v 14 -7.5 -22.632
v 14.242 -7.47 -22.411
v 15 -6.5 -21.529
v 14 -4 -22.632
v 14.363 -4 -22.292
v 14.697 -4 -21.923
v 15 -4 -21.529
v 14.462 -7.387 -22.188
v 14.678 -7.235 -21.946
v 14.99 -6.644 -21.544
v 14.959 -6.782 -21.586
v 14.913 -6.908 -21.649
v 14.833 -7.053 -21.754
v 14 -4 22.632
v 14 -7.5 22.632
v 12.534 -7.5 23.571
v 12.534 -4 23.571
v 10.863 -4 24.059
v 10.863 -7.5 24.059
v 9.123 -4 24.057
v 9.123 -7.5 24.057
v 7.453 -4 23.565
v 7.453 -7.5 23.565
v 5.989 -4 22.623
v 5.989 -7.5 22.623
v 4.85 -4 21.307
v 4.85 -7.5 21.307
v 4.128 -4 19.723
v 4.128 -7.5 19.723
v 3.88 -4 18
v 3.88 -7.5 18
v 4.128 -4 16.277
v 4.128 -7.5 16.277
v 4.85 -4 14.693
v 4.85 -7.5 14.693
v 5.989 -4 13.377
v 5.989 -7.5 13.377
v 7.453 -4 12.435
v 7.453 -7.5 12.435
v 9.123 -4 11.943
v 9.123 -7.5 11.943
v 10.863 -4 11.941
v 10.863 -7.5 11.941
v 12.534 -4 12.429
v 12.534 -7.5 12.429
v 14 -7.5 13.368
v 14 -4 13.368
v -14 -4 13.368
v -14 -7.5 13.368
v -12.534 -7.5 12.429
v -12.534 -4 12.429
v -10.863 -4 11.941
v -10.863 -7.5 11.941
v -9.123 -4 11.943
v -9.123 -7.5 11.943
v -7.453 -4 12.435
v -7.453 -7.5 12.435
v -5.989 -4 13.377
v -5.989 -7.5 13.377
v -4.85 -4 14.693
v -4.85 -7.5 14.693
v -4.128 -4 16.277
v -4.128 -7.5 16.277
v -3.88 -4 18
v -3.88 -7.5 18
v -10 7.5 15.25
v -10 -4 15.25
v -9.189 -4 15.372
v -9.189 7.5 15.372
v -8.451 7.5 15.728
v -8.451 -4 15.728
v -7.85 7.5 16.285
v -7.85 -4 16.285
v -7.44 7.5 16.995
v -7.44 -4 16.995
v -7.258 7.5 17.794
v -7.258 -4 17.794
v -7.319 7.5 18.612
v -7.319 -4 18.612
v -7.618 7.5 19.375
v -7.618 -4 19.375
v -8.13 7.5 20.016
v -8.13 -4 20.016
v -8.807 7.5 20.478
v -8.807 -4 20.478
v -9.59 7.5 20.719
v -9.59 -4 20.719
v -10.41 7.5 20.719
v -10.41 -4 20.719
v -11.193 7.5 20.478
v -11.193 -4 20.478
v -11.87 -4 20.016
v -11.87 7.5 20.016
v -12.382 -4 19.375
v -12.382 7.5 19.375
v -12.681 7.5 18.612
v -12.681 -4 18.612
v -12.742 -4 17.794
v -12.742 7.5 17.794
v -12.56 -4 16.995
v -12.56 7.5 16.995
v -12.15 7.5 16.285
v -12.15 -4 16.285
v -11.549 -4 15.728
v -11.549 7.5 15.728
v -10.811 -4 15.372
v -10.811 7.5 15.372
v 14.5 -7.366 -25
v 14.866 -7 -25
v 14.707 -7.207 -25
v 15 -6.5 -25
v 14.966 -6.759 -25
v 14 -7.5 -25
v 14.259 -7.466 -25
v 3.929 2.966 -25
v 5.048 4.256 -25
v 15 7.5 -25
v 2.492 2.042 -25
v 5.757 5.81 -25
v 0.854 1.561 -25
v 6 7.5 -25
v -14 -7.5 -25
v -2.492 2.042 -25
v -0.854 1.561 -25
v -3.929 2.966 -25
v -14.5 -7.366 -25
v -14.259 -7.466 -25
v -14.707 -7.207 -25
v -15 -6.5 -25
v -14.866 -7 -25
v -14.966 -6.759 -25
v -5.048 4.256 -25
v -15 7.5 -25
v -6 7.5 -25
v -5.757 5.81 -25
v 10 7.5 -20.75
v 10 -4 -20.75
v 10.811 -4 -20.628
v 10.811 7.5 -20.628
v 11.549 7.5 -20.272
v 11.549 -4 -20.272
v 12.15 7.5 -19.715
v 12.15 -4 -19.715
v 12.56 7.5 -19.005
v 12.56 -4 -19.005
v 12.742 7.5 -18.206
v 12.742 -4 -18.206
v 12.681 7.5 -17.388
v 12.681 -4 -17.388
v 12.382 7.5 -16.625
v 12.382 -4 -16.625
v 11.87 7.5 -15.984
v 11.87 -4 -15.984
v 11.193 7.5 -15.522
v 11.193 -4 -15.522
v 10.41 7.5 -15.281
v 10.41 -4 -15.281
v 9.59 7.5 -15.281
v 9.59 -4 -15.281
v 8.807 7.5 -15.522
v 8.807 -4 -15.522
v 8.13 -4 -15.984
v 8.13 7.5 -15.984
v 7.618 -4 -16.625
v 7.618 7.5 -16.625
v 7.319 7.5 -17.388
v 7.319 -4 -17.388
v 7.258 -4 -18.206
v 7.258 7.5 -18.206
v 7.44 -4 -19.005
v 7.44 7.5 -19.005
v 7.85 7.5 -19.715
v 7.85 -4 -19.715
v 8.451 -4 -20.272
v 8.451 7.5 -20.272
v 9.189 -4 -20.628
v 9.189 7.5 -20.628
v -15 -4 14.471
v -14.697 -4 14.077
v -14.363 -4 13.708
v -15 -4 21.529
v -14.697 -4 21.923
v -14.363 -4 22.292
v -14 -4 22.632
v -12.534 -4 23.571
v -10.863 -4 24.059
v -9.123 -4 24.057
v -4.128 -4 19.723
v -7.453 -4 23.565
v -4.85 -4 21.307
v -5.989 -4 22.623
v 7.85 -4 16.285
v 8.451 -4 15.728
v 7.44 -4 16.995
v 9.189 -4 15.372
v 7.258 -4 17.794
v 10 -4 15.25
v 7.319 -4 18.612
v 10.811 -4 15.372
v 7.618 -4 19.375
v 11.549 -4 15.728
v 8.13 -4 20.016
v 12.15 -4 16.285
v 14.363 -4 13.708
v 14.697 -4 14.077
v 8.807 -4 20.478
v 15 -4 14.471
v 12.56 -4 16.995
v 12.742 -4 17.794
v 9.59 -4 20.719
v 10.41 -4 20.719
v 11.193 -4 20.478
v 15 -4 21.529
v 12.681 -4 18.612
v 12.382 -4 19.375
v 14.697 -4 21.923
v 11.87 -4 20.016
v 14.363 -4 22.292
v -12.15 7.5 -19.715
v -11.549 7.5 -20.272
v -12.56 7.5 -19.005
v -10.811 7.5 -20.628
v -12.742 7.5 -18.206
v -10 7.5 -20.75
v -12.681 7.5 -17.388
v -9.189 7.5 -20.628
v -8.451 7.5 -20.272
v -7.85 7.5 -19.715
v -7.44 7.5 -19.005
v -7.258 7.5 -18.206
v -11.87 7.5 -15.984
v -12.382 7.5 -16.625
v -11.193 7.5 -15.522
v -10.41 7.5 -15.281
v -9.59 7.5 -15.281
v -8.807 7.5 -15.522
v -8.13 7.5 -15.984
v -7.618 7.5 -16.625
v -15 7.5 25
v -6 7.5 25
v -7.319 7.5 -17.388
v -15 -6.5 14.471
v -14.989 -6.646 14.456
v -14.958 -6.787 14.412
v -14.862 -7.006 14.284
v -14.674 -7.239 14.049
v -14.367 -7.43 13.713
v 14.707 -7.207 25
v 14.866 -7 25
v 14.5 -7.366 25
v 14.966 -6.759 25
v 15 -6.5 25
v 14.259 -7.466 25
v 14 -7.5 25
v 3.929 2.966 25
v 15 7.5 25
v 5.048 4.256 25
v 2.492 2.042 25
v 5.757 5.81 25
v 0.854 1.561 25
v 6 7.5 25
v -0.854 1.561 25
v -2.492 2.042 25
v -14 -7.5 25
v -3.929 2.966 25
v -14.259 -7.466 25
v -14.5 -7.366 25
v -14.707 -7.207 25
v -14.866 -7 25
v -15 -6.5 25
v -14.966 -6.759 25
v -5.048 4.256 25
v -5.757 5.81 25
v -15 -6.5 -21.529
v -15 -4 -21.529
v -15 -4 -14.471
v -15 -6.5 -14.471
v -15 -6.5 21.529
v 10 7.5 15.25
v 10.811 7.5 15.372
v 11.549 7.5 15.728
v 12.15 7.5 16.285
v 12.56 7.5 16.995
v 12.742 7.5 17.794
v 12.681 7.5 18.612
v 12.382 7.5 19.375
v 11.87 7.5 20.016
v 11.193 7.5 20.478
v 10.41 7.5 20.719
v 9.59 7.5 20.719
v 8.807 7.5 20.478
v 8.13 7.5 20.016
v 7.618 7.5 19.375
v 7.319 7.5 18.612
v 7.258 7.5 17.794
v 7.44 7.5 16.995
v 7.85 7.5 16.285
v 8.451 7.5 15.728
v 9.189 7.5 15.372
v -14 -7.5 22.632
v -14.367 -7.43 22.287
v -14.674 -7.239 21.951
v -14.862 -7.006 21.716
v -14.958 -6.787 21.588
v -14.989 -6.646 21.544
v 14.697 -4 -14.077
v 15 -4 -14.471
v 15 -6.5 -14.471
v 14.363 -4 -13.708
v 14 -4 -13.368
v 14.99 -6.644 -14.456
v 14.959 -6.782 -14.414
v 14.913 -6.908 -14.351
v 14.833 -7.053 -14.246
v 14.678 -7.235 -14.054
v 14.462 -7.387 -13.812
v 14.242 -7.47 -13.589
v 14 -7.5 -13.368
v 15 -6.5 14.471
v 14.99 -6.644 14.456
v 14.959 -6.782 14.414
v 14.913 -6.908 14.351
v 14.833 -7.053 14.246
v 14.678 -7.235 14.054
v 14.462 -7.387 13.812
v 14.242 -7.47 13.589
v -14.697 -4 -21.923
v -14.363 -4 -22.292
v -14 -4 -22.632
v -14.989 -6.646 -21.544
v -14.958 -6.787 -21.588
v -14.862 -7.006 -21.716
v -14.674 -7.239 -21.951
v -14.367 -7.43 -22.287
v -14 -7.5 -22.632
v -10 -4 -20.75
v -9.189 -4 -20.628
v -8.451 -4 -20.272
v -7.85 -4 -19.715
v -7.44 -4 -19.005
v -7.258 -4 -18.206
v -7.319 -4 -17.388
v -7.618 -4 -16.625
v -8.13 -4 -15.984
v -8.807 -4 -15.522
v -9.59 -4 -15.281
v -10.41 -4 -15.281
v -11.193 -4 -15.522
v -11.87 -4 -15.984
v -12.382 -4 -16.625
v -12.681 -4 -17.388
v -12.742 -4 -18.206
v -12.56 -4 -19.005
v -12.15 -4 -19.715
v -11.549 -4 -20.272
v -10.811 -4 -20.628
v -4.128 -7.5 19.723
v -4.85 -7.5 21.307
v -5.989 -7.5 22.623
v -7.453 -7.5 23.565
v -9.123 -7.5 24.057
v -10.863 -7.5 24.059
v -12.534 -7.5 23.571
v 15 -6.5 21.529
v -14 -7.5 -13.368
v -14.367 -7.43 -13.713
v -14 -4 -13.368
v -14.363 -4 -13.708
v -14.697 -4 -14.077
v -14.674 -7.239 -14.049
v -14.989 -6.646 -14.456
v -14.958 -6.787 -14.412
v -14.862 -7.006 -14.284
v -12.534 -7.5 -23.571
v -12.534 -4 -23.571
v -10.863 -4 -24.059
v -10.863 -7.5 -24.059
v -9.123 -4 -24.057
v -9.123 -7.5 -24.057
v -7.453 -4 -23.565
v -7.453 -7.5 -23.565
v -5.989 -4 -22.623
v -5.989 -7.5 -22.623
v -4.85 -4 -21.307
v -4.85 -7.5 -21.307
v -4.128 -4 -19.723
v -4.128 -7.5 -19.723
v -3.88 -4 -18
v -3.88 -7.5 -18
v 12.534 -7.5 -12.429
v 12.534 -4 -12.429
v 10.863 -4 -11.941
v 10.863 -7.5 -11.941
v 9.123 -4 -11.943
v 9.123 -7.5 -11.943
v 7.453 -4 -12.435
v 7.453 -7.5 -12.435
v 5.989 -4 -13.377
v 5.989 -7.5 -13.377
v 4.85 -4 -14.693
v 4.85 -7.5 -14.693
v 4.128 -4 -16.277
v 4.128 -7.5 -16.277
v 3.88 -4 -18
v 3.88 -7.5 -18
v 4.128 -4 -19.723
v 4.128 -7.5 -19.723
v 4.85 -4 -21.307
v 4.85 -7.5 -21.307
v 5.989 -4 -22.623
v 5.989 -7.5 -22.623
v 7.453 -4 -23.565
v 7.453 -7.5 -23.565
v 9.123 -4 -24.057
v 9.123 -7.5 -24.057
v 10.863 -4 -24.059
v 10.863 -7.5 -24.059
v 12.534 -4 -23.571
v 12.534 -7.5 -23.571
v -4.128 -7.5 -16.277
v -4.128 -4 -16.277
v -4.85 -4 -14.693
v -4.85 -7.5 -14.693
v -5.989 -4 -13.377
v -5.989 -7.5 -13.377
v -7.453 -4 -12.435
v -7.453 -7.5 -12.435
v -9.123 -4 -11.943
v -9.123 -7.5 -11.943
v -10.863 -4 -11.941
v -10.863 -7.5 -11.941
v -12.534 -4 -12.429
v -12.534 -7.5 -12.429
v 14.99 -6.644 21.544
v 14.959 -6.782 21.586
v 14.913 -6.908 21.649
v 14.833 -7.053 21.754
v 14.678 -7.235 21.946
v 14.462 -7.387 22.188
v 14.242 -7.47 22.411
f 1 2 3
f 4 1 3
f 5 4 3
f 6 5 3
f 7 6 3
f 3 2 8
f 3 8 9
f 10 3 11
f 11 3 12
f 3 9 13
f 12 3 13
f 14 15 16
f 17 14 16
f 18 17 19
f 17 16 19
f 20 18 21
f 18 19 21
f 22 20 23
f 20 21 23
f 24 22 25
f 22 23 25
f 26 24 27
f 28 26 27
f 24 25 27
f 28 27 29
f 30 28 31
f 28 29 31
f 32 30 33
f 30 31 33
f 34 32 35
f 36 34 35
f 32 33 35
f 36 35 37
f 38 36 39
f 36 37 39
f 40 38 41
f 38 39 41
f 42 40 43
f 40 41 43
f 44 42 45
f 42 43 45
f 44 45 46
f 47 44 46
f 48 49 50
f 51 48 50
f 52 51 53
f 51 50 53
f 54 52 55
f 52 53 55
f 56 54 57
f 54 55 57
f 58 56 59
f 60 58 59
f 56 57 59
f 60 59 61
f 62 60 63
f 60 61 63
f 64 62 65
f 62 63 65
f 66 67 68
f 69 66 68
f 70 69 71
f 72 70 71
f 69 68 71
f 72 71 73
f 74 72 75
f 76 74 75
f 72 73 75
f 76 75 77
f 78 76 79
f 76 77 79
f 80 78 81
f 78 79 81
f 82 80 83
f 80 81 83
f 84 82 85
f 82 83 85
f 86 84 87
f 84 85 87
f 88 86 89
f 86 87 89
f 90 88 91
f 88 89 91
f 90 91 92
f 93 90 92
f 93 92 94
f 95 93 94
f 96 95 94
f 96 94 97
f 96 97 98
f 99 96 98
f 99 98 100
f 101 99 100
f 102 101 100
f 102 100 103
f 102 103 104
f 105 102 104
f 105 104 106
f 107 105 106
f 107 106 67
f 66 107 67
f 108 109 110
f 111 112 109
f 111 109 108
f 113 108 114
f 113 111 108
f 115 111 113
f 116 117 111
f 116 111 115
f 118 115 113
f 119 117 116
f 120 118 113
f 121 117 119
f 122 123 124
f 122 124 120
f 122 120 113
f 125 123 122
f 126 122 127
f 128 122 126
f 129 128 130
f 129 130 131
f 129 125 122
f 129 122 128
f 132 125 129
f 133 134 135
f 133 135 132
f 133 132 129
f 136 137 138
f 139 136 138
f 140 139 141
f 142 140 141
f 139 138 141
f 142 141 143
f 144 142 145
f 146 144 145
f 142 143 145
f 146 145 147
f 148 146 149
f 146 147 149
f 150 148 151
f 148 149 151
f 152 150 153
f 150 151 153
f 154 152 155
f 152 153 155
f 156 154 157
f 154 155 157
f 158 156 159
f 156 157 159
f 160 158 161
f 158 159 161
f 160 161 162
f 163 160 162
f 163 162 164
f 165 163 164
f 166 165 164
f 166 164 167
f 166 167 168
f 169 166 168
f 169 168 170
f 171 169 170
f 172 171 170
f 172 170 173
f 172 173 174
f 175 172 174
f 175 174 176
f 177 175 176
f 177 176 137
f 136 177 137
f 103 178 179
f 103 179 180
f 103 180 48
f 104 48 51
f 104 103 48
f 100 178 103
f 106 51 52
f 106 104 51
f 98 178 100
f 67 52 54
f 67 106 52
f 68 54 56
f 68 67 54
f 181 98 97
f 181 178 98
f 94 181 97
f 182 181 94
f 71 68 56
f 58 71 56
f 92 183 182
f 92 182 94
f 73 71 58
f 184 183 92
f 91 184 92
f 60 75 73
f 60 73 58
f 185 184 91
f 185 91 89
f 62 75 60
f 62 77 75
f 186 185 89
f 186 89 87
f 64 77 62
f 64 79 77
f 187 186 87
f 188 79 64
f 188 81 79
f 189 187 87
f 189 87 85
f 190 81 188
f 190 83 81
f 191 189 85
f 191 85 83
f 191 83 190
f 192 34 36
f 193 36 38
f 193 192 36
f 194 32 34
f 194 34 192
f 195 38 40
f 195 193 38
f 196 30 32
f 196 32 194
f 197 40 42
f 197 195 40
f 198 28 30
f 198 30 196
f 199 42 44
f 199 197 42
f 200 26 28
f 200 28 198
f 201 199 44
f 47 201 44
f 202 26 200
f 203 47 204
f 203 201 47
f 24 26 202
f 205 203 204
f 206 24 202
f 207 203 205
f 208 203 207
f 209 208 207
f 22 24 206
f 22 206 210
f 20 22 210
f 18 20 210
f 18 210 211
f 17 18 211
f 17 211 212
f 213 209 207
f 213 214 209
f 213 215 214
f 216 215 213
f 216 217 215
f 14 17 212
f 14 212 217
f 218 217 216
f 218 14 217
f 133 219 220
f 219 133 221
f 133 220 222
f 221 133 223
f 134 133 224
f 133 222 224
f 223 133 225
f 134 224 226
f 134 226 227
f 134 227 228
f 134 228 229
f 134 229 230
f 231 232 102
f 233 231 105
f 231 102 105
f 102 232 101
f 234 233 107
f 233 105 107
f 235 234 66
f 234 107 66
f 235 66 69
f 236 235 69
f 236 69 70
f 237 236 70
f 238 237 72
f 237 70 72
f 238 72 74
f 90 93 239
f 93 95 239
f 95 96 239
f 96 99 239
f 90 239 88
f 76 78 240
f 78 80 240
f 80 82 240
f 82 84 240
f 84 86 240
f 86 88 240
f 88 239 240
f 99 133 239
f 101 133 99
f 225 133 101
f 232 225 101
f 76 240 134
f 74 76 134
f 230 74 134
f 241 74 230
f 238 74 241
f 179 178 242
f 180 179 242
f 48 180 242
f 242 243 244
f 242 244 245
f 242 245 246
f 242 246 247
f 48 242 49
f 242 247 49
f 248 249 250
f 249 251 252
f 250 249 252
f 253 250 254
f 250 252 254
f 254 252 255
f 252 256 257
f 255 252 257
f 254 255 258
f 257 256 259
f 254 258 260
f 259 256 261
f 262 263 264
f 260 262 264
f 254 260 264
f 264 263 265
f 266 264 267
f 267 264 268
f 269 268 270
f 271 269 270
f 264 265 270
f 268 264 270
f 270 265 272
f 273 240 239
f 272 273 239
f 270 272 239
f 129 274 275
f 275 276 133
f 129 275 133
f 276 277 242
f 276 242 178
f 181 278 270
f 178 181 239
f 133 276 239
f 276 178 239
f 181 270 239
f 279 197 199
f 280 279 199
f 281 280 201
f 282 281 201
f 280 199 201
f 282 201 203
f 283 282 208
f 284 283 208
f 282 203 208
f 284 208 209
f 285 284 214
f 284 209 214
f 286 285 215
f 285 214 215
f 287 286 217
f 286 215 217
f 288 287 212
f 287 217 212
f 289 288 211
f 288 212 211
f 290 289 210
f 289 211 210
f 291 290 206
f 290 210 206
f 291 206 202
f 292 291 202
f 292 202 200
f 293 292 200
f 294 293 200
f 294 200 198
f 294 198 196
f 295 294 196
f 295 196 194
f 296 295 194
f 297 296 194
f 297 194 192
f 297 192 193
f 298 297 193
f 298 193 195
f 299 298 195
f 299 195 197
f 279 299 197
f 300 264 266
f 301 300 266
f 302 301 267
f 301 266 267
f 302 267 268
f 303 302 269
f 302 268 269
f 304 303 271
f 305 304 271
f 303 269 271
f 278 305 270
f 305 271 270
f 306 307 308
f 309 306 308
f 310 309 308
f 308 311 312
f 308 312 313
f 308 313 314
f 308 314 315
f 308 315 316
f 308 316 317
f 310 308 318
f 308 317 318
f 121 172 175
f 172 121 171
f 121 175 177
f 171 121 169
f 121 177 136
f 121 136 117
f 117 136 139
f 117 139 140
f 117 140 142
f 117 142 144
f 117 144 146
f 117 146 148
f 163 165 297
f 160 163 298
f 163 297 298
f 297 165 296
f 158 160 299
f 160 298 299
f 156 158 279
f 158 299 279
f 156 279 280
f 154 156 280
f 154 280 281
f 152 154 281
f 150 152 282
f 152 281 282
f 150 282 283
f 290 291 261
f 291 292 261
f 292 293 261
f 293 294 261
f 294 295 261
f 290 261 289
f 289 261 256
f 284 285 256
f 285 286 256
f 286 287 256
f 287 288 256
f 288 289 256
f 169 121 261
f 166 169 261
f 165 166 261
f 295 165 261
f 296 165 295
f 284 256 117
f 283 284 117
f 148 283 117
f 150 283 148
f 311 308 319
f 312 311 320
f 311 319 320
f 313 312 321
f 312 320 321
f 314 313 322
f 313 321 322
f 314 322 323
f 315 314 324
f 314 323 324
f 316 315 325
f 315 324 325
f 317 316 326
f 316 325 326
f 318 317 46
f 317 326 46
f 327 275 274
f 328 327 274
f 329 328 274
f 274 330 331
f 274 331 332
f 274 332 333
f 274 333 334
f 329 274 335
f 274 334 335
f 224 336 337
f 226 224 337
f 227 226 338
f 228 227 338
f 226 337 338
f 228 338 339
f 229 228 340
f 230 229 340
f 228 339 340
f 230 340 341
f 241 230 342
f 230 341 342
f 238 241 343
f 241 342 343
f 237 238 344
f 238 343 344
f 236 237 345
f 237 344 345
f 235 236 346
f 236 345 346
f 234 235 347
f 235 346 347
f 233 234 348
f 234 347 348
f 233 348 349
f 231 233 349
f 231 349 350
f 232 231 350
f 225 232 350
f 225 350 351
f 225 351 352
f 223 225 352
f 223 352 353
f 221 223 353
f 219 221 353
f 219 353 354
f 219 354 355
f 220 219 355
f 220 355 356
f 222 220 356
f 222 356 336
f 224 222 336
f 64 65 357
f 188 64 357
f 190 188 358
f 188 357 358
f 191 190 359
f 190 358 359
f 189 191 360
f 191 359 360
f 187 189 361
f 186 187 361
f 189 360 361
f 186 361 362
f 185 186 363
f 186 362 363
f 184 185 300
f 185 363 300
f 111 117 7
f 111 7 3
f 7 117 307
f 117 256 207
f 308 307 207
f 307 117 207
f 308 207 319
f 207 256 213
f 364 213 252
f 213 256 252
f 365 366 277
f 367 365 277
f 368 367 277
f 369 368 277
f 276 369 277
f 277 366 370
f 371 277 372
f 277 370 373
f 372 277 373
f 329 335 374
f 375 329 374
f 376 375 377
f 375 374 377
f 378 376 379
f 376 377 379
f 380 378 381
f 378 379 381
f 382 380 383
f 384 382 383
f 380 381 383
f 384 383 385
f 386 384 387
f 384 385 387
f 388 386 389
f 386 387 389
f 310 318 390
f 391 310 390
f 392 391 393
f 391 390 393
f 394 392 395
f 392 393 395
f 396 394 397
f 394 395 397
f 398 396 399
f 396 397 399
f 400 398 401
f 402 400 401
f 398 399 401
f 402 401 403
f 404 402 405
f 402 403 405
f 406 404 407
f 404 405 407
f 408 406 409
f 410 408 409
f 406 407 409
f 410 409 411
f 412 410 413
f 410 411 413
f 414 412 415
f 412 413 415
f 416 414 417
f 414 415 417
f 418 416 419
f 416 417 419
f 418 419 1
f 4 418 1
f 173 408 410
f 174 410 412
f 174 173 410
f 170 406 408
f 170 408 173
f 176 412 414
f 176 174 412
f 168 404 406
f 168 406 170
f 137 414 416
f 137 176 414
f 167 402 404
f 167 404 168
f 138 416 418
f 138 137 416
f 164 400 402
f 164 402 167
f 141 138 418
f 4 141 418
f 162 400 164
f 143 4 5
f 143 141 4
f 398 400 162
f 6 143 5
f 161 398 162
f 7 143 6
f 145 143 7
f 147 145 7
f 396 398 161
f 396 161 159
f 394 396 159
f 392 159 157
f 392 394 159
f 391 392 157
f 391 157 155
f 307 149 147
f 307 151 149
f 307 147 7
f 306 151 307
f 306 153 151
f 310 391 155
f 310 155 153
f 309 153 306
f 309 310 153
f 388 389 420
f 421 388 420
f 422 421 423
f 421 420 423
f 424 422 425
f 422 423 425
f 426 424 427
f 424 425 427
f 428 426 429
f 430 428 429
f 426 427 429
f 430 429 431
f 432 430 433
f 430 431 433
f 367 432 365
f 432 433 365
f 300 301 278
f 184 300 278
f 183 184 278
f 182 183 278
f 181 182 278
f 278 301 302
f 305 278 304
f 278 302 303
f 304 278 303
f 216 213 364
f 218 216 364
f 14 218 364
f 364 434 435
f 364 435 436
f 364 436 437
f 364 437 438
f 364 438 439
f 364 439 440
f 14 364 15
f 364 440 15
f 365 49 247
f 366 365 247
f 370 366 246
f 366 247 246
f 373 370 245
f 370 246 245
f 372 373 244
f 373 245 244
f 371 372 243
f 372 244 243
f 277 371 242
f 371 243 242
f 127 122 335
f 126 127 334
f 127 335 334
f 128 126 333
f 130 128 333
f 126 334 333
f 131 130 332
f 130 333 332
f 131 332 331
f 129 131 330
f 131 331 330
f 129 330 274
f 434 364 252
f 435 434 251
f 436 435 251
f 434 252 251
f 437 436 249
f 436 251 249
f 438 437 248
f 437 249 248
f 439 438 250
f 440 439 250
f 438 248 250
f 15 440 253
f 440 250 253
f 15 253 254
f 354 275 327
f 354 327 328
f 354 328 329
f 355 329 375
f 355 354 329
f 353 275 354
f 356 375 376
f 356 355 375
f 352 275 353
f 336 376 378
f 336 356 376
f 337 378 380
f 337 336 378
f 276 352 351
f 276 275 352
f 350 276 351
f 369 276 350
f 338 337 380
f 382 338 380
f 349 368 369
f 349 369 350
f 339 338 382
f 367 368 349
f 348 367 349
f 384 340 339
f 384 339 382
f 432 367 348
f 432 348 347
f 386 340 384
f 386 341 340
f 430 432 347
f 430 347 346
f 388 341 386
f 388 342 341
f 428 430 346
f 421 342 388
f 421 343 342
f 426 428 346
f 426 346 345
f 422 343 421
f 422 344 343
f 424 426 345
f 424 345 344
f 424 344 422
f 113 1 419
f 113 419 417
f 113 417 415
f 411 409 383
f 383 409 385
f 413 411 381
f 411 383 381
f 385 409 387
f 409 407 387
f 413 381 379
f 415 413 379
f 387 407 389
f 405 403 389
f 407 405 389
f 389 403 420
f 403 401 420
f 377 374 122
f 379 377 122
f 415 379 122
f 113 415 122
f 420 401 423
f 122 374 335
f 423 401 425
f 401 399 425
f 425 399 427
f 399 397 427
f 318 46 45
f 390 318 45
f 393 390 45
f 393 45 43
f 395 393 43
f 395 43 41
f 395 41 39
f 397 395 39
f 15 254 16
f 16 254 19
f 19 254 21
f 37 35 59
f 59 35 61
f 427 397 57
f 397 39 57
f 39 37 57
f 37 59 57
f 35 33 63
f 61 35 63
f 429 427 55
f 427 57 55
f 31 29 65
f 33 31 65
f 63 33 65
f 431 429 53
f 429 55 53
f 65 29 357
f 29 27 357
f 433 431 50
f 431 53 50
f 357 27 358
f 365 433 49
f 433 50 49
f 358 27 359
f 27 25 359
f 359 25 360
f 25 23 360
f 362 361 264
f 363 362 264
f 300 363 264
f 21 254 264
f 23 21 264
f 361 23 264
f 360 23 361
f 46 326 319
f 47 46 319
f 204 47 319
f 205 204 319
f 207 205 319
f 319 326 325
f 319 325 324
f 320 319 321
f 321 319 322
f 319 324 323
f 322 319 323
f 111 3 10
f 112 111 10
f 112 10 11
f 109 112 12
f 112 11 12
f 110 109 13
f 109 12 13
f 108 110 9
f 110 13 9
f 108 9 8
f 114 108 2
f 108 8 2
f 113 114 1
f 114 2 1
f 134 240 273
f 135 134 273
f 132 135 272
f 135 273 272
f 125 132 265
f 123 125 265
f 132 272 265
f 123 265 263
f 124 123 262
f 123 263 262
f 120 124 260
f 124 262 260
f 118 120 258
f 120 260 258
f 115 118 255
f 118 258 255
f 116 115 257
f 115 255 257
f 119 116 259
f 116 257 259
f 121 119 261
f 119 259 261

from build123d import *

# Parameters (mm, degrees)
BOSS_EXTRUDE2_DEPTH = 25
SKETCH2_R           = 6.12
CUT_EXTRUDE1_DEPTH  = 3.5
SKETCH2_3_R         = 2.75
CUT_EXTRUDE2_DEPTH  = 33.787192744


with BuildPart() as part:
    # Sketch1 → Boss-Extrude2 (new, symmetric)
    with BuildSketch(Plane.XY):
        with BuildLine():
            Line((6, 7.5), (15, 7.5))
            Line((15, 7.5), (15, -6.5))
            ThreePointArc((15, -6.5), (14.707106781, -7.207106781), (14, -7.5))
            Line((14, -7.5), (-14, -7.5))
            ThreePointArc((-14, -7.5), (-14.707106781, -7.207106781), (-15, -6.5))
            Line((-15, -6.5), (-15, 7.5))
            Line((-15, 7.5), (-6, 7.5))
            ThreePointArc((-6, 7.5), (0, 1.5), (6, 7.5))
        make_face()
    extrude(amount=BOSS_EXTRUDE2_DEPTH, both=True)

    # Sketch2 → Cut-Extrude1 (cut)
    with BuildSketch(Plane.XZ.offset(7.5)):
        with Locations((10, 18)):
            Circle(SKETCH2_R)
        with Locations((10, -18)):
            Circle(SKETCH2_R)
        with Locations((-10, -18)):
            Circle(SKETCH2_R)
        with Locations((-10, 18)):
            Circle(SKETCH2_R)
    extrude(amount=-CUT_EXTRUDE1_DEPTH, mode=Mode.SUBTRACT)

    # Sketch2<3> → Cut-Extrude2 (cut, through all)
    with BuildSketch(Plane.XZ.offset(7.5)):
        with Locations((10, 18)):
            Circle(SKETCH2_3_R)
        with Locations((10, -18)):
            Circle(SKETCH2_3_R)
        with Locations((-10, -18)):
            Circle(SKETCH2_3_R)
        with Locations((-10, 18)):
            Circle(SKETCH2_3_R)
    extrude(amount=-CUT_EXTRUDE2_DEPTH, mode=Mode.SUBTRACT)


solid = part.part
